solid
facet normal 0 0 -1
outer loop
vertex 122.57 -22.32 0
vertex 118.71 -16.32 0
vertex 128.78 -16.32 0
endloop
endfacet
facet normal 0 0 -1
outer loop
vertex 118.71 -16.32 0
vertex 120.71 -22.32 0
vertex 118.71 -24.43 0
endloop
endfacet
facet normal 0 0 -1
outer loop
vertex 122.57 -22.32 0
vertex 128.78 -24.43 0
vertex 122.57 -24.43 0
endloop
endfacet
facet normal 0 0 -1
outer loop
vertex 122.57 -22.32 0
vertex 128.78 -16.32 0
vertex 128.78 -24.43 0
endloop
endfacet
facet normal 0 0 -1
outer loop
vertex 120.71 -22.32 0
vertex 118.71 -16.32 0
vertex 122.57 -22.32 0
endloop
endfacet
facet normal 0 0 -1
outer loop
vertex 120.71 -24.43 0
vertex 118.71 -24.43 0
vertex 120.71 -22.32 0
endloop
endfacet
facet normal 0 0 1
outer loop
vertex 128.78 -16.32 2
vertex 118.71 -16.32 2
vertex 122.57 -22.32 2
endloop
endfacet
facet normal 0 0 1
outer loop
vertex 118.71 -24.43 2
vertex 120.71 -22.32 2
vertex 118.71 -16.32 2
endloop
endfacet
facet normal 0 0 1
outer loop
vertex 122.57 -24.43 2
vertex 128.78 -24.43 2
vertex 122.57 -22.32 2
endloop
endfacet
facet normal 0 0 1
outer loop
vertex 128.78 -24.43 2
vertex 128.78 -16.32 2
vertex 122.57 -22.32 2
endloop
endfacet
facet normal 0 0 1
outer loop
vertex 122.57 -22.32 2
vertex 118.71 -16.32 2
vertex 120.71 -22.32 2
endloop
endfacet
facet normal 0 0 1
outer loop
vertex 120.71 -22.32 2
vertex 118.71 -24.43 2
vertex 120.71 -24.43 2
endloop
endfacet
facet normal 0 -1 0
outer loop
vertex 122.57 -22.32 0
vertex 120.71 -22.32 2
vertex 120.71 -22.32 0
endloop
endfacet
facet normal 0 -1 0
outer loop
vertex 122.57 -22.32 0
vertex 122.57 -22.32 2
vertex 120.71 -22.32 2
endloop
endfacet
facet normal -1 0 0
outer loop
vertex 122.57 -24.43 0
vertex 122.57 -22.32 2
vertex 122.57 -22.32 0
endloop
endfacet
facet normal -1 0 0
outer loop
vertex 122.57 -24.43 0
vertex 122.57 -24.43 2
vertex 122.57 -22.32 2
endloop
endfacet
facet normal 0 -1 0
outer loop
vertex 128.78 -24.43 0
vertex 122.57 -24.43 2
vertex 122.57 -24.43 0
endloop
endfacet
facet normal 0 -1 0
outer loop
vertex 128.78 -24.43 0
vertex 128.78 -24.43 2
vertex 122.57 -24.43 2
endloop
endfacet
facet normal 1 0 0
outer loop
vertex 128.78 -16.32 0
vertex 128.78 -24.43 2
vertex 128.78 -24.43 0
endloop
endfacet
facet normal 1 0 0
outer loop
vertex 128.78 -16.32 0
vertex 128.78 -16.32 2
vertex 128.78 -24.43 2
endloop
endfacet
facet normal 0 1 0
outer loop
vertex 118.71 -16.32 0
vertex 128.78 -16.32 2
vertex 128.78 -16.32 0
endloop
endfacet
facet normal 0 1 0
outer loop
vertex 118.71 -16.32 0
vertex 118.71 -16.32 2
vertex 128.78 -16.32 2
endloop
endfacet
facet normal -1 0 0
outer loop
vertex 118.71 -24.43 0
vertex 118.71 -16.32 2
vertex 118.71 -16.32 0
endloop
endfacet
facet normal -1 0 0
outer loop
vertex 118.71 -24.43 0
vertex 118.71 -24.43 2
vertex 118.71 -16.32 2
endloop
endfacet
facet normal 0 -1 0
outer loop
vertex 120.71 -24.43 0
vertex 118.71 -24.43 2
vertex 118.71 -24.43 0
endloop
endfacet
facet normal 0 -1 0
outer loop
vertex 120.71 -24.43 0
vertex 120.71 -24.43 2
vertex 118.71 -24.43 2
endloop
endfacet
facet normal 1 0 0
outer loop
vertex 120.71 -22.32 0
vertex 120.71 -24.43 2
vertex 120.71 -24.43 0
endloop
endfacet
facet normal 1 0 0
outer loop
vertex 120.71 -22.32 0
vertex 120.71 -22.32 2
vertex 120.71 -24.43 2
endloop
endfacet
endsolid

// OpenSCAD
linear_extrude(height = 2, center = false) {

polygon(points=[[122.71,-16.32],[122.68,-16.32],[122.64,-16.32],[122.61,-16.32],[122.57,-16.32],[122.11,-16.32],[121.64,-16.32],[121.18,-16.32],[120.71,-16.32],[120.21,-16.32],[119.71,-16.32],[119.21,-16.32],[118.71,-16.32],[118.71,-18.35],[118.71,-20.38],[118.71,-22.4],[118.71,-24.43],[119.21,-24.43],[119.71,-24.43],[120.21,-24.43],[120.71,-24.43],[120.71,-23.9],[120.71,-23.38],[120.71,-22.85],[120.71,-22.32],[121.18,-22.32],[121.64,-22.32],[122.11,-22.32],[122.57,-22.32],[122.57,-22.85],[122.57,-23.38],[122.57,-23.9],[122.57,-24.43],[124.13,-24.43],[125.68,-24.43],[127.23,-24.43],[128.78,-24.43],[128.78,-22.4],[128.78,-20.38],[128.78,-18.35],[128.78,-16.32],[127.26,-16.32],[125.75,-16.32],[124.23,-16.32],[122.71,-16.32]]);

}
